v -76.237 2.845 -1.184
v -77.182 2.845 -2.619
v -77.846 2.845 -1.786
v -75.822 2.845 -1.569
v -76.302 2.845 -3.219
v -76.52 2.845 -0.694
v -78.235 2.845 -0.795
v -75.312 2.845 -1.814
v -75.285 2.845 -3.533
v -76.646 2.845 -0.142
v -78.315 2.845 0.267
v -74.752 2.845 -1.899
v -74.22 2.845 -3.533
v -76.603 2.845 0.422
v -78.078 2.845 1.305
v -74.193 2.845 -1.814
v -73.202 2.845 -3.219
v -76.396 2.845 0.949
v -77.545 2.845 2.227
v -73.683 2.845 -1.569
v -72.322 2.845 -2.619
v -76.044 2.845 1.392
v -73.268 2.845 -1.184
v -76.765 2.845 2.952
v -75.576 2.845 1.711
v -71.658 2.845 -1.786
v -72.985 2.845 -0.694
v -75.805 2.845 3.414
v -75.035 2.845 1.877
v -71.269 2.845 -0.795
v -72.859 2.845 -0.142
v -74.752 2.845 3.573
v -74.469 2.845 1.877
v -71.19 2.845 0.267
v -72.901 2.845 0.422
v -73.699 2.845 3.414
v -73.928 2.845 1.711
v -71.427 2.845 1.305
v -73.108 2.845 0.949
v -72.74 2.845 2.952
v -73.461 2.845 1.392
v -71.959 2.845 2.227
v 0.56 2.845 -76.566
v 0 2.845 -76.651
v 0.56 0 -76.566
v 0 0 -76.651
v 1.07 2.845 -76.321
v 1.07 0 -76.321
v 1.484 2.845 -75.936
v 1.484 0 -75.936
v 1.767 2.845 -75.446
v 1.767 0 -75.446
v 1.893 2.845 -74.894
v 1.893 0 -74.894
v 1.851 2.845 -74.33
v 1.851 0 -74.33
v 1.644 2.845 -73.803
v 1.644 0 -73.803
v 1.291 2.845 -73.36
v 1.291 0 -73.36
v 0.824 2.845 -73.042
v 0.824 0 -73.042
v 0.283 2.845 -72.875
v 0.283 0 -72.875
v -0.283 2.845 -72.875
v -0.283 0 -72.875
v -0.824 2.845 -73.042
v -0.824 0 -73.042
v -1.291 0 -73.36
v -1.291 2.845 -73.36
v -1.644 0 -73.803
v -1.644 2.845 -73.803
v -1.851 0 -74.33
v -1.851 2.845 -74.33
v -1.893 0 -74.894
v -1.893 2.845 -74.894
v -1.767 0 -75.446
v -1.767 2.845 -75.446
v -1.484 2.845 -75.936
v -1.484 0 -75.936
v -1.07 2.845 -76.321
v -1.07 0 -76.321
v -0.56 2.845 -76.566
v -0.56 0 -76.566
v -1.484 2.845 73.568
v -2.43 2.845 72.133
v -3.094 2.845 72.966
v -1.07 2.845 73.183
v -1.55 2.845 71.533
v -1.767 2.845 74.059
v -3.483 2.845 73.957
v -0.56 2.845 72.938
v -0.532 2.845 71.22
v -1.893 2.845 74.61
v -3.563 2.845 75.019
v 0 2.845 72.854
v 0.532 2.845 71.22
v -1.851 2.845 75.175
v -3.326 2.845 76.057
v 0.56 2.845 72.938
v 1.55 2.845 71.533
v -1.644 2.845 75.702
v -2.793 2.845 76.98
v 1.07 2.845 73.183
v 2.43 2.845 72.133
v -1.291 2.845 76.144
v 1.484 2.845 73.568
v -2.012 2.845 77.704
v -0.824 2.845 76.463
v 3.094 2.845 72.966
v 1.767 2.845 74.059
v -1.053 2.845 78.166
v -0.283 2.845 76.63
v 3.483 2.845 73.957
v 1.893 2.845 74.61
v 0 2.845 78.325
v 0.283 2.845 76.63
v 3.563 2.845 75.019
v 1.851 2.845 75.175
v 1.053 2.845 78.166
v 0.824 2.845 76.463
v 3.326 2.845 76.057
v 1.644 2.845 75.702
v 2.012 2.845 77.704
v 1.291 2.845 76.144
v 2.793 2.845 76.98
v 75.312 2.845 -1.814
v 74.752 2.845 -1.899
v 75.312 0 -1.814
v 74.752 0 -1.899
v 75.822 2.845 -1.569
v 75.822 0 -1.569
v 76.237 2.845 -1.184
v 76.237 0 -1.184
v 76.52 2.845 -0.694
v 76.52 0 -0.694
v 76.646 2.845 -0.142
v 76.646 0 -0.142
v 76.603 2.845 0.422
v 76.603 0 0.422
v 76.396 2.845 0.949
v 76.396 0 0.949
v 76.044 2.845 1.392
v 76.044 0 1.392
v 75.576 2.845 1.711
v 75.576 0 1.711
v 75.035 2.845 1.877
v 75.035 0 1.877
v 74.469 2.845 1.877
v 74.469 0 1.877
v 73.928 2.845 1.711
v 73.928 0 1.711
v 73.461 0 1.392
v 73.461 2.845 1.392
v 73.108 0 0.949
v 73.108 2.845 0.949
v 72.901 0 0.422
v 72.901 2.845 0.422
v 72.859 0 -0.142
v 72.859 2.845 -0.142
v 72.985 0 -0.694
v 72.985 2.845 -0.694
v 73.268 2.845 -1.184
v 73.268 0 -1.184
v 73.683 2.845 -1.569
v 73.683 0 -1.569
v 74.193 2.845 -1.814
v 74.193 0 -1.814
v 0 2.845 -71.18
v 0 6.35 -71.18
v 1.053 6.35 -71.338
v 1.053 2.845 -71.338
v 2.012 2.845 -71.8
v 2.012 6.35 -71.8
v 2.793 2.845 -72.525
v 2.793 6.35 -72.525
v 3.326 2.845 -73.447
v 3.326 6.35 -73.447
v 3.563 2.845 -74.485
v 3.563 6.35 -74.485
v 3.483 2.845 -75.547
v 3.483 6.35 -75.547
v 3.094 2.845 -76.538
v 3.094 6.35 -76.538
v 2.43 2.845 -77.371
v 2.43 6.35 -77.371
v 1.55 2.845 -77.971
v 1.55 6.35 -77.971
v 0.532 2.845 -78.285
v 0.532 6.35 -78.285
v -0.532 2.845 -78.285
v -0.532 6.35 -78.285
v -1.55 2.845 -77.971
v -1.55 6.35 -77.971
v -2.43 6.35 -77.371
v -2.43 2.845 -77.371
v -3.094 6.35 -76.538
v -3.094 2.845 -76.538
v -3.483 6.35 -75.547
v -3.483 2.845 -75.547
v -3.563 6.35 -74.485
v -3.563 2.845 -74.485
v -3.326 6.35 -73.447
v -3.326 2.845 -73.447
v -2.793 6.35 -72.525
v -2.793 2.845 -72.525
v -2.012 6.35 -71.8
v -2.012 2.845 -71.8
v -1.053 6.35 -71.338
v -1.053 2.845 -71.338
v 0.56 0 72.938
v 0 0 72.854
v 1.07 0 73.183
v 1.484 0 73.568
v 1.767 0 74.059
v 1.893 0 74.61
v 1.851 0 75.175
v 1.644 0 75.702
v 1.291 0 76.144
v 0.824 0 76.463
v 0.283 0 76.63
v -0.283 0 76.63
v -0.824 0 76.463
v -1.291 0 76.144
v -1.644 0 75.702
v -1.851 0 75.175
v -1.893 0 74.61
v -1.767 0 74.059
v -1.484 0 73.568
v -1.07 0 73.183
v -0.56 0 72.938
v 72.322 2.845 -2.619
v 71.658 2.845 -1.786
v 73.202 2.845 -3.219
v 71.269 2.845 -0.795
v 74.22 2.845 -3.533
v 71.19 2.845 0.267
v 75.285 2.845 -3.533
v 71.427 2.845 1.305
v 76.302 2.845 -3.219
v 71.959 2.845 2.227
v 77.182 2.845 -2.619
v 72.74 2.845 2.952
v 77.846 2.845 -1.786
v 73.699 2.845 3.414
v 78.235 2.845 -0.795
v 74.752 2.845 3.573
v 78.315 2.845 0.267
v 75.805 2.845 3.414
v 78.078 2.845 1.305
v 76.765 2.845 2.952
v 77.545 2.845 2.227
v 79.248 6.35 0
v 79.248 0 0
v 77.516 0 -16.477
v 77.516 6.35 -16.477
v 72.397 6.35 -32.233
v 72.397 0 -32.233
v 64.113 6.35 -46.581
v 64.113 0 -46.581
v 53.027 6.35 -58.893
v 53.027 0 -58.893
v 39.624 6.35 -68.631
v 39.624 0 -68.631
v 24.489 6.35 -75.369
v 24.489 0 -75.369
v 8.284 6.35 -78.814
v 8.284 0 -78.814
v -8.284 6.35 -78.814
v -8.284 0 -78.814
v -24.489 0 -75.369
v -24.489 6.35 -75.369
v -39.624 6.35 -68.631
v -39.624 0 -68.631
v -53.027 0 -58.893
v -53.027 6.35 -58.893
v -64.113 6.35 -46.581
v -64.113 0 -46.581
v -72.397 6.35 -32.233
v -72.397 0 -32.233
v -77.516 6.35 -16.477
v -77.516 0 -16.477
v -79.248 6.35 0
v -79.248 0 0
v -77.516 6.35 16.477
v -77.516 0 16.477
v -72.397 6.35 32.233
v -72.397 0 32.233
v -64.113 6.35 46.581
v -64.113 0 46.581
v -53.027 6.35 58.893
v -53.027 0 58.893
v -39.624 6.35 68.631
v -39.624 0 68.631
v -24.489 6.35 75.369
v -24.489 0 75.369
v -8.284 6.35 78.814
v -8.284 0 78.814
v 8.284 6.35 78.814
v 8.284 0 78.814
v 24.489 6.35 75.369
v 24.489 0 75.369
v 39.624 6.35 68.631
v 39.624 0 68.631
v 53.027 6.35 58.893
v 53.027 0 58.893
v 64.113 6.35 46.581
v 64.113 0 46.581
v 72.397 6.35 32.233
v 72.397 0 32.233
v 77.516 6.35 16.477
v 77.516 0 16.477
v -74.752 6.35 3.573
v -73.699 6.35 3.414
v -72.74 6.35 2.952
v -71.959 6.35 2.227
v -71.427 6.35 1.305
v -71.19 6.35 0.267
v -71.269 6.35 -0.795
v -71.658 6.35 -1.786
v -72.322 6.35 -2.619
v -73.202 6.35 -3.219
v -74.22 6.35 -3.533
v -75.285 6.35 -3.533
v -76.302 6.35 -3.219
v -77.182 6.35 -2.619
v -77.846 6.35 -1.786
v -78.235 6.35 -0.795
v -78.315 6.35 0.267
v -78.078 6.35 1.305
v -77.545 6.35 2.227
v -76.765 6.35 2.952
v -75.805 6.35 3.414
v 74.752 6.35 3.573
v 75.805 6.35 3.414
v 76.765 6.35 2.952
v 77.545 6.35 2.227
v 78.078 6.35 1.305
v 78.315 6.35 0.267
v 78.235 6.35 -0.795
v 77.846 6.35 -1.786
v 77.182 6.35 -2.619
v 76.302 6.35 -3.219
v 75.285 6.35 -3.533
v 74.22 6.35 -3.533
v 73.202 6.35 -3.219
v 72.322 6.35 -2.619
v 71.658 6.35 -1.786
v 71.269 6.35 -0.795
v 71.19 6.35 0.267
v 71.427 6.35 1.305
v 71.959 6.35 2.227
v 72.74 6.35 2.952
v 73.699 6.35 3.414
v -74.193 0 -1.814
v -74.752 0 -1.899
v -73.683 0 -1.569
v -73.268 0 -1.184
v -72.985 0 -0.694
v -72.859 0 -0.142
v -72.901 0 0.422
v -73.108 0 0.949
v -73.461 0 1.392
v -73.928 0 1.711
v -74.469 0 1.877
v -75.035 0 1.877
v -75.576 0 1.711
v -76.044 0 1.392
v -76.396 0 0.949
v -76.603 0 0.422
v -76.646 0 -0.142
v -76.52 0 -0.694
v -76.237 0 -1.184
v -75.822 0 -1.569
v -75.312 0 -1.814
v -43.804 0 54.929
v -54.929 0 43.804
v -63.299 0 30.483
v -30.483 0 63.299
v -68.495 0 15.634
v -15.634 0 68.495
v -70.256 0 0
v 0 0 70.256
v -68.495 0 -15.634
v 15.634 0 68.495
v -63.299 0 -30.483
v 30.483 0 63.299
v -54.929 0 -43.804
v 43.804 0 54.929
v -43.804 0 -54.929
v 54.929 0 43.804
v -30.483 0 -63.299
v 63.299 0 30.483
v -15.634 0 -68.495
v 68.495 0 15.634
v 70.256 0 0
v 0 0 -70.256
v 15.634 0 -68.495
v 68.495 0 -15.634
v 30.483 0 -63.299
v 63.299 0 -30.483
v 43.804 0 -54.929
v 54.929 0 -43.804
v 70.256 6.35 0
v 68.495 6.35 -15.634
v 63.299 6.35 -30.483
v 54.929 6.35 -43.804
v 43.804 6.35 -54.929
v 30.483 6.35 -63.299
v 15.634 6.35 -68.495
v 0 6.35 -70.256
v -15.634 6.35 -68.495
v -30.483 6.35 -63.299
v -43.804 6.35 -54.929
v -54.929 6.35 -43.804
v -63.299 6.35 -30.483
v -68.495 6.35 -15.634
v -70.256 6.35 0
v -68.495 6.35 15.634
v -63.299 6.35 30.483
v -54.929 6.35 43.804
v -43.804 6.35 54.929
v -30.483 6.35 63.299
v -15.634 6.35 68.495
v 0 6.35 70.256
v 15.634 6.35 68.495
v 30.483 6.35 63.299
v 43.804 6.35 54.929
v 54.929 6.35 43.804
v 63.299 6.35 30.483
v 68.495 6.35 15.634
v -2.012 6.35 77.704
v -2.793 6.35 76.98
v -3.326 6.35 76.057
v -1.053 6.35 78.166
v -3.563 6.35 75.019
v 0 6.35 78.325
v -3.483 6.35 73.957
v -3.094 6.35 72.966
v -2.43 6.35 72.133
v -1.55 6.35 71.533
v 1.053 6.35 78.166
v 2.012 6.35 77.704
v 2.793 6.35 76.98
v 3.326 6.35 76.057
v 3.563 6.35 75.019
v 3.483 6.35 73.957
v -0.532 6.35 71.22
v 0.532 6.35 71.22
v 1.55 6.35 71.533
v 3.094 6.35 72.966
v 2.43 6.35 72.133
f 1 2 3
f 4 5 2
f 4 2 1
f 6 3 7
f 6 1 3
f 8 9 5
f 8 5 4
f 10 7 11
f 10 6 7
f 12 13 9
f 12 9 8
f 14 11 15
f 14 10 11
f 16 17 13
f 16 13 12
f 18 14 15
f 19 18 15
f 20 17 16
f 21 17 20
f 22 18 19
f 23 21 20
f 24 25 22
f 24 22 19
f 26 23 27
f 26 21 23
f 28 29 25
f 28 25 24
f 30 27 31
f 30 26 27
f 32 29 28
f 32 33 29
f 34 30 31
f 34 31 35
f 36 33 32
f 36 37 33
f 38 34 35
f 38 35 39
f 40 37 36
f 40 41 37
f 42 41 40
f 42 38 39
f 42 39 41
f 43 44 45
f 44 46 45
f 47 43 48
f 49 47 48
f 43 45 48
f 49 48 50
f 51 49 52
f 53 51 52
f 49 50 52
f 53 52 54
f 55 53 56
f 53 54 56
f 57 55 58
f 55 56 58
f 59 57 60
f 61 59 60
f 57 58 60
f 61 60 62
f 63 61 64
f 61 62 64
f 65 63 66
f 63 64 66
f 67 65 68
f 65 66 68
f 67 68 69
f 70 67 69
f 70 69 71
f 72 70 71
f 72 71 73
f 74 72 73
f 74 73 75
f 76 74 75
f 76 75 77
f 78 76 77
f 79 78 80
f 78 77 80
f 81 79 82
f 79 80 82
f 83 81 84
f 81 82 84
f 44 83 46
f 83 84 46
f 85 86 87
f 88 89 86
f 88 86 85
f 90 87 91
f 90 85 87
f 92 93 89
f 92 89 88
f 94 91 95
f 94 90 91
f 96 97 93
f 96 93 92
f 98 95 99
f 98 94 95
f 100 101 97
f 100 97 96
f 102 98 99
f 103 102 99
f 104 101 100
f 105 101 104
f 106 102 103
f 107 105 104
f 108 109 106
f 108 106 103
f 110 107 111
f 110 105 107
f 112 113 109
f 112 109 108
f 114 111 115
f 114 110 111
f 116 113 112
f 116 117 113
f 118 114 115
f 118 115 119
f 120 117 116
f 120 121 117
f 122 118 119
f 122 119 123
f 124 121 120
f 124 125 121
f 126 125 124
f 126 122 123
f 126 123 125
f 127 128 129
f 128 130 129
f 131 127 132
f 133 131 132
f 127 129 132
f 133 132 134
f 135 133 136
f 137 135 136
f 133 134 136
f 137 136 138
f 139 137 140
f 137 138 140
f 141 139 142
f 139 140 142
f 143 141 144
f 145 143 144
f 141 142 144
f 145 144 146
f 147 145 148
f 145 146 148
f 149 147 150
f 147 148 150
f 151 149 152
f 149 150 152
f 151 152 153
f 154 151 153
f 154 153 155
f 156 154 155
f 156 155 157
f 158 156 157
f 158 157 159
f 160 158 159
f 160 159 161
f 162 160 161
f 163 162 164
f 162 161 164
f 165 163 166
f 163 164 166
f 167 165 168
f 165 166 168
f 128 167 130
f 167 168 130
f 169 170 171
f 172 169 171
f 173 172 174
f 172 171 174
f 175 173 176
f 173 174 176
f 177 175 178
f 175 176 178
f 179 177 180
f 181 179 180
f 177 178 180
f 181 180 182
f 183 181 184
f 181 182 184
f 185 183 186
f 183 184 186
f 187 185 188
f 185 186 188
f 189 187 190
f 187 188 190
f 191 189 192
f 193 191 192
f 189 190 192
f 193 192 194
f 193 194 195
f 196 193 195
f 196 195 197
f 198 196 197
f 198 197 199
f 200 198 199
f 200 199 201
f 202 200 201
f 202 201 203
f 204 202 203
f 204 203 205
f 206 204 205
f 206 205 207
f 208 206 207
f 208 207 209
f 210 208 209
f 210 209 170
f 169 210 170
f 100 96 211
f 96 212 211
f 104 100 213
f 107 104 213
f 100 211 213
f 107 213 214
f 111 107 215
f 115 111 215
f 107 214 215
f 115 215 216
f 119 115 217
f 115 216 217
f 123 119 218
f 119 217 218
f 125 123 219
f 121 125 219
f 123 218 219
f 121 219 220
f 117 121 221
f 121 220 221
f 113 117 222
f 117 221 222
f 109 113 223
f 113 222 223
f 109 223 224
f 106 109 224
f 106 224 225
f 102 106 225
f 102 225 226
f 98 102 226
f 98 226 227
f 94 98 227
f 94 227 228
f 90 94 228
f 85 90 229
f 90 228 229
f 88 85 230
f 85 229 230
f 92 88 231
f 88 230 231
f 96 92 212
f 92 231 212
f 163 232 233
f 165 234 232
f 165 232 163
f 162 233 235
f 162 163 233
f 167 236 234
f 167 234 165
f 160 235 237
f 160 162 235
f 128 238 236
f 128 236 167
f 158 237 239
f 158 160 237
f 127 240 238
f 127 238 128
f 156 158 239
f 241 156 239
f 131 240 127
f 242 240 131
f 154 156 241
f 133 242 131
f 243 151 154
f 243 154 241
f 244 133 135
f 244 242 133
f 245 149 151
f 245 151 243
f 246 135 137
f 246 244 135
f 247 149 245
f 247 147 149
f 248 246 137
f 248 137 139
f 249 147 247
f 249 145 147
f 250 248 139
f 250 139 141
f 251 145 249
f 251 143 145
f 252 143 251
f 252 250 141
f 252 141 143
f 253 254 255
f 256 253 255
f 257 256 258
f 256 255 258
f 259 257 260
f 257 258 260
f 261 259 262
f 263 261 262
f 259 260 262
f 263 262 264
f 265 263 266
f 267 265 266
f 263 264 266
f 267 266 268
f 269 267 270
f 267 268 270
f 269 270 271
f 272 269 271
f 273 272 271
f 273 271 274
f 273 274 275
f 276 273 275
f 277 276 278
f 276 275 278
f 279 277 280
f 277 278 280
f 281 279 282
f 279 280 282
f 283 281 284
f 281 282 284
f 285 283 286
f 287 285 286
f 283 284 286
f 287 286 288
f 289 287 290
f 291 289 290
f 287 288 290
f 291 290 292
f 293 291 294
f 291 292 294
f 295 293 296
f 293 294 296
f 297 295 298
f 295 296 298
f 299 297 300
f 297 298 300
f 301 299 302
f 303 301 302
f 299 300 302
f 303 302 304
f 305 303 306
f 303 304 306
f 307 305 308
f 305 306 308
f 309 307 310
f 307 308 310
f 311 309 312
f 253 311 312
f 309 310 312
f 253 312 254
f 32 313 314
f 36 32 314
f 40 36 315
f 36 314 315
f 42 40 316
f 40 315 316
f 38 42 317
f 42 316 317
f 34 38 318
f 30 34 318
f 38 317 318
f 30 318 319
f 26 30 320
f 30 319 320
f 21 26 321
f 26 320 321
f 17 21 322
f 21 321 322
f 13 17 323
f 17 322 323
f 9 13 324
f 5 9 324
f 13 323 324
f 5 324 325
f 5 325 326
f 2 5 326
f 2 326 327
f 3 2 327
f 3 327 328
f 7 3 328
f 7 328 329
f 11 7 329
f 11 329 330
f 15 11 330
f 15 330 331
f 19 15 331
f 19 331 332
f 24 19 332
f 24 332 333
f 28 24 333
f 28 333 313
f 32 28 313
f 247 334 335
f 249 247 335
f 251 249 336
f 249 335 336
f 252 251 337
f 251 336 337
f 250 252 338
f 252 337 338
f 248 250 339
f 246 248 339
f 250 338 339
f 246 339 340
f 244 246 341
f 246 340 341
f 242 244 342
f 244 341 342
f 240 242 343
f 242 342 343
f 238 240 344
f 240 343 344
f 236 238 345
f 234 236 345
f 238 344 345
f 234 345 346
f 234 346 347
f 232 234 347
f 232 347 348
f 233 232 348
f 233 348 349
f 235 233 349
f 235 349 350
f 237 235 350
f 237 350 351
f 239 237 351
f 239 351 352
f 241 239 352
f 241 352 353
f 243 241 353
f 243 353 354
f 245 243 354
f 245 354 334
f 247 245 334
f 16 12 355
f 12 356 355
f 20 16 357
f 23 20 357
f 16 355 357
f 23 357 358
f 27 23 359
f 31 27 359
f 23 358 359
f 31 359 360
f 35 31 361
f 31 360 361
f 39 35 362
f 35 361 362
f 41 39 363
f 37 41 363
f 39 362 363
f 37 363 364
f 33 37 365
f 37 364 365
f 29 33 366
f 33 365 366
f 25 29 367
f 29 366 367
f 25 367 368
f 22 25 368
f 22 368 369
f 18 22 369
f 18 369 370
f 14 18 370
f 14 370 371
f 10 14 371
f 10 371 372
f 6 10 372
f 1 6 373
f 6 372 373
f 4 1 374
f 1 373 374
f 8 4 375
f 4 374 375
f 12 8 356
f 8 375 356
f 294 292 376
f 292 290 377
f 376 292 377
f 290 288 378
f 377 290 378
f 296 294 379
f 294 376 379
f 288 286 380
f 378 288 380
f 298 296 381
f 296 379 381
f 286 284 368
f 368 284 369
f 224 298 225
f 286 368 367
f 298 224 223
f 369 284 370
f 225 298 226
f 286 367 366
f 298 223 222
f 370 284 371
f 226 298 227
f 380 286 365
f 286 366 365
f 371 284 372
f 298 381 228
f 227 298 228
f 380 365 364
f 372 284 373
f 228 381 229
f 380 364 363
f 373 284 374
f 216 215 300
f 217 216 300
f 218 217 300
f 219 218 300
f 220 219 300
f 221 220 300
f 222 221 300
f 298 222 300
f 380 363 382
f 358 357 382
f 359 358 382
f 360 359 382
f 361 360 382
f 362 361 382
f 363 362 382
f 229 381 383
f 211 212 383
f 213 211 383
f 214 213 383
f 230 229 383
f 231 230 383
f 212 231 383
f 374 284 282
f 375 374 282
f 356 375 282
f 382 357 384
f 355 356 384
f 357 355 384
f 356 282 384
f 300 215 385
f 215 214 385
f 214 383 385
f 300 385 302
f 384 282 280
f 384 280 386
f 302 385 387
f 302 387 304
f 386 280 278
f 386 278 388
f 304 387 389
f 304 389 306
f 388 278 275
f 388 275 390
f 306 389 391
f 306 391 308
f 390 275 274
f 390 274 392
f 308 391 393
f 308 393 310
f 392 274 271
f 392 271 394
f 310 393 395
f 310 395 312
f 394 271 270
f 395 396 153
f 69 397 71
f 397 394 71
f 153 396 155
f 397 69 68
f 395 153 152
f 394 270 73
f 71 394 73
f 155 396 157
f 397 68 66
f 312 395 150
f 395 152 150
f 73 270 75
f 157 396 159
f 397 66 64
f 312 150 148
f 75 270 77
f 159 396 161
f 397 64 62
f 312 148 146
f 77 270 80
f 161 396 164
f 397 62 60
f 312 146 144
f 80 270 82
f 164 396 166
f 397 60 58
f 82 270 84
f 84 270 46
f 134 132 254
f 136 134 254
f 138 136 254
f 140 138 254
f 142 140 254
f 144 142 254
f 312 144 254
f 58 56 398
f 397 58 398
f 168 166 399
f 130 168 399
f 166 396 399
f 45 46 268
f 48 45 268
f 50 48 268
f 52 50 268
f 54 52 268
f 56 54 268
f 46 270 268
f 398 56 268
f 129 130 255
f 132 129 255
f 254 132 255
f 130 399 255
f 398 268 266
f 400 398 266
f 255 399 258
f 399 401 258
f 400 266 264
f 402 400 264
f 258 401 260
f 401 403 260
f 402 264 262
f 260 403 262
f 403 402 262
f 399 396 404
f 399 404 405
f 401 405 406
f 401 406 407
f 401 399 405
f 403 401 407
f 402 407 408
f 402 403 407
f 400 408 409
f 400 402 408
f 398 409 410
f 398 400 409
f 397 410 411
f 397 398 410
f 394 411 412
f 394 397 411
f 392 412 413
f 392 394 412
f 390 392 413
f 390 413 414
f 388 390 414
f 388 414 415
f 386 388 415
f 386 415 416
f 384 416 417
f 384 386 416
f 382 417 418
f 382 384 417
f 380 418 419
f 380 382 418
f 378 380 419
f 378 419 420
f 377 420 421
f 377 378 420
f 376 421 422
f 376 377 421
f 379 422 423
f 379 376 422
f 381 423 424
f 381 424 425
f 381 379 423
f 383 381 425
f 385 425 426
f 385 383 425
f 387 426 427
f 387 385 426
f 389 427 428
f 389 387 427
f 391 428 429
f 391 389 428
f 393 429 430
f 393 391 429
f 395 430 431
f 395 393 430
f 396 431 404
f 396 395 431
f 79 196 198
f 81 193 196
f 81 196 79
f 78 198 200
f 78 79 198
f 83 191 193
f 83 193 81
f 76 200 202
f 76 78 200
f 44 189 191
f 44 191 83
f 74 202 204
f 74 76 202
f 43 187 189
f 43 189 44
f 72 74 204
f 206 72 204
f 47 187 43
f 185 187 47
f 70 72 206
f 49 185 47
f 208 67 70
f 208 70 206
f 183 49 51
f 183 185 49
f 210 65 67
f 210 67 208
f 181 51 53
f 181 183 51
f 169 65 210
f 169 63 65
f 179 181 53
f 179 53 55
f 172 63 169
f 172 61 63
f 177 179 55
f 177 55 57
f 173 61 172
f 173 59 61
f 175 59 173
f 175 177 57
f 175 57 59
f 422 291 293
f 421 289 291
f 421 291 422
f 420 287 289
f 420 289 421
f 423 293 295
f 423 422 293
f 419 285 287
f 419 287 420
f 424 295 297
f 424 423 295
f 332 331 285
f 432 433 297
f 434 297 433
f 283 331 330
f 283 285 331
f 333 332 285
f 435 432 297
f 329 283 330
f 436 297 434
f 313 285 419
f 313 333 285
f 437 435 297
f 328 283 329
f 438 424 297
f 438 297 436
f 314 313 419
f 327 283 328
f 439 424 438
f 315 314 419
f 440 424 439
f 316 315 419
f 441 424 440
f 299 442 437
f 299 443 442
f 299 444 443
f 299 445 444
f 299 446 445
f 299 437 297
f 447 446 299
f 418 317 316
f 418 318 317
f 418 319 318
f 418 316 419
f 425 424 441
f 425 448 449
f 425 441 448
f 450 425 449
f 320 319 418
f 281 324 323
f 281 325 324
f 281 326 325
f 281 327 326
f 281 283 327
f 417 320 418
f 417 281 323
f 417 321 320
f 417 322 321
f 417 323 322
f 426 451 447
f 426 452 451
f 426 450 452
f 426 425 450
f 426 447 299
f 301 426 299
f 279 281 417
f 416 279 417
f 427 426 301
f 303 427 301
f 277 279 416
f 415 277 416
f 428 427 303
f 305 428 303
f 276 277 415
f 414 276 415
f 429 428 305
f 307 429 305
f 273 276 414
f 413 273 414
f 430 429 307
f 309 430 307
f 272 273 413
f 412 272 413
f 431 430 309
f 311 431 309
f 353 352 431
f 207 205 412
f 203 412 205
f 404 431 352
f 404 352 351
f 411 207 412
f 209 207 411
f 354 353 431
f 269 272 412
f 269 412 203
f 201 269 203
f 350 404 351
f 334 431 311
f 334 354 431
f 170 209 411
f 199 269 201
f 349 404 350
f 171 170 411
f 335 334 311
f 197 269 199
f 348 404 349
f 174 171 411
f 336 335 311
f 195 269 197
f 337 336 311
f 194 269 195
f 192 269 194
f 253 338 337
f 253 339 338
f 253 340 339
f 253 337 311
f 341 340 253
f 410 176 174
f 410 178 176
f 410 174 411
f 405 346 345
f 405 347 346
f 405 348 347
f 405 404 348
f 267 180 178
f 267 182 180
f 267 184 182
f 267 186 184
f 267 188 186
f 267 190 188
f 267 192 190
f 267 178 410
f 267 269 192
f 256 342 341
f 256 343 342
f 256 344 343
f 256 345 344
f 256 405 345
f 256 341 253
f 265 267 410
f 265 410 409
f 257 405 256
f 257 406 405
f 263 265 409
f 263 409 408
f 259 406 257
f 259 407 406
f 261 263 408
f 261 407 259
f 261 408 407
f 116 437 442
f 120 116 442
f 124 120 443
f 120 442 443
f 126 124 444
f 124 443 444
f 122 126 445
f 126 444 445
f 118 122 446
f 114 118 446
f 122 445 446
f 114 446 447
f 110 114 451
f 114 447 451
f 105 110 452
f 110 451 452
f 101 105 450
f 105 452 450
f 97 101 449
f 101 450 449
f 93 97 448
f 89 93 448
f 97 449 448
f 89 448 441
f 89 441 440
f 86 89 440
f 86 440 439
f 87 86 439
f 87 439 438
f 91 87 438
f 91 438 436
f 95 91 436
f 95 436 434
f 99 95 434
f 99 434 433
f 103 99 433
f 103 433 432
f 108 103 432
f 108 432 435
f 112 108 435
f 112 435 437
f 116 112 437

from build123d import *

# Parameters (mm, degrees)
SKETCH1_R                                      = 79.248
SKETCH1_R_2                                    = 70.2564
EXTRUDE2_DEPTH                                 = 6.35
CBORE_FOR_6_SOCKET_HEAD_CAP_SCREW1_D           = 3.7973
CBORE_FOR_6_SOCKET_HEAD_CAP_SCREW1_CBORE_D     = 7.14502
CBORE_FOR_6_SOCKET_HEAD_CAP_SCREW1_CBORE_DEPTH = 3.5052


with BuildPart() as part:
    # Sketch1 → Extrude2 (new body)
    with BuildSketch(Plane(origin=(0, 0, 0), x_dir=(1, 0, 0), z_dir=(0, 1, 0))):
        Circle(SKETCH1_R)
        Circle(SKETCH1_R_2, mode=Mode.SUBTRACT)
    extrude(amount=EXTRUDE2_DEPTH)

    # CBORE for #6 Socket Head Cap Screw1 (through all)
    with Locations(Plane(origin=(0, 6.35, -74.7522), x_dir=(0, 0, 1), z_dir=(0, 1, 0))):
        with Locations((0, 0), (149.5044, 0), (74.7522, 74.7522), (74.7522, -74.7522)):
            CounterBoreHole(CBORE_FOR_6_SOCKET_HEAD_CAP_SCREW1_D / 2, CBORE_FOR_6_SOCKET_HEAD_CAP_SCREW1_CBORE_D / 2, CBORE_FOR_6_SOCKET_HEAD_CAP_SCREW1_CBORE_DEPTH)


solid = part.part
